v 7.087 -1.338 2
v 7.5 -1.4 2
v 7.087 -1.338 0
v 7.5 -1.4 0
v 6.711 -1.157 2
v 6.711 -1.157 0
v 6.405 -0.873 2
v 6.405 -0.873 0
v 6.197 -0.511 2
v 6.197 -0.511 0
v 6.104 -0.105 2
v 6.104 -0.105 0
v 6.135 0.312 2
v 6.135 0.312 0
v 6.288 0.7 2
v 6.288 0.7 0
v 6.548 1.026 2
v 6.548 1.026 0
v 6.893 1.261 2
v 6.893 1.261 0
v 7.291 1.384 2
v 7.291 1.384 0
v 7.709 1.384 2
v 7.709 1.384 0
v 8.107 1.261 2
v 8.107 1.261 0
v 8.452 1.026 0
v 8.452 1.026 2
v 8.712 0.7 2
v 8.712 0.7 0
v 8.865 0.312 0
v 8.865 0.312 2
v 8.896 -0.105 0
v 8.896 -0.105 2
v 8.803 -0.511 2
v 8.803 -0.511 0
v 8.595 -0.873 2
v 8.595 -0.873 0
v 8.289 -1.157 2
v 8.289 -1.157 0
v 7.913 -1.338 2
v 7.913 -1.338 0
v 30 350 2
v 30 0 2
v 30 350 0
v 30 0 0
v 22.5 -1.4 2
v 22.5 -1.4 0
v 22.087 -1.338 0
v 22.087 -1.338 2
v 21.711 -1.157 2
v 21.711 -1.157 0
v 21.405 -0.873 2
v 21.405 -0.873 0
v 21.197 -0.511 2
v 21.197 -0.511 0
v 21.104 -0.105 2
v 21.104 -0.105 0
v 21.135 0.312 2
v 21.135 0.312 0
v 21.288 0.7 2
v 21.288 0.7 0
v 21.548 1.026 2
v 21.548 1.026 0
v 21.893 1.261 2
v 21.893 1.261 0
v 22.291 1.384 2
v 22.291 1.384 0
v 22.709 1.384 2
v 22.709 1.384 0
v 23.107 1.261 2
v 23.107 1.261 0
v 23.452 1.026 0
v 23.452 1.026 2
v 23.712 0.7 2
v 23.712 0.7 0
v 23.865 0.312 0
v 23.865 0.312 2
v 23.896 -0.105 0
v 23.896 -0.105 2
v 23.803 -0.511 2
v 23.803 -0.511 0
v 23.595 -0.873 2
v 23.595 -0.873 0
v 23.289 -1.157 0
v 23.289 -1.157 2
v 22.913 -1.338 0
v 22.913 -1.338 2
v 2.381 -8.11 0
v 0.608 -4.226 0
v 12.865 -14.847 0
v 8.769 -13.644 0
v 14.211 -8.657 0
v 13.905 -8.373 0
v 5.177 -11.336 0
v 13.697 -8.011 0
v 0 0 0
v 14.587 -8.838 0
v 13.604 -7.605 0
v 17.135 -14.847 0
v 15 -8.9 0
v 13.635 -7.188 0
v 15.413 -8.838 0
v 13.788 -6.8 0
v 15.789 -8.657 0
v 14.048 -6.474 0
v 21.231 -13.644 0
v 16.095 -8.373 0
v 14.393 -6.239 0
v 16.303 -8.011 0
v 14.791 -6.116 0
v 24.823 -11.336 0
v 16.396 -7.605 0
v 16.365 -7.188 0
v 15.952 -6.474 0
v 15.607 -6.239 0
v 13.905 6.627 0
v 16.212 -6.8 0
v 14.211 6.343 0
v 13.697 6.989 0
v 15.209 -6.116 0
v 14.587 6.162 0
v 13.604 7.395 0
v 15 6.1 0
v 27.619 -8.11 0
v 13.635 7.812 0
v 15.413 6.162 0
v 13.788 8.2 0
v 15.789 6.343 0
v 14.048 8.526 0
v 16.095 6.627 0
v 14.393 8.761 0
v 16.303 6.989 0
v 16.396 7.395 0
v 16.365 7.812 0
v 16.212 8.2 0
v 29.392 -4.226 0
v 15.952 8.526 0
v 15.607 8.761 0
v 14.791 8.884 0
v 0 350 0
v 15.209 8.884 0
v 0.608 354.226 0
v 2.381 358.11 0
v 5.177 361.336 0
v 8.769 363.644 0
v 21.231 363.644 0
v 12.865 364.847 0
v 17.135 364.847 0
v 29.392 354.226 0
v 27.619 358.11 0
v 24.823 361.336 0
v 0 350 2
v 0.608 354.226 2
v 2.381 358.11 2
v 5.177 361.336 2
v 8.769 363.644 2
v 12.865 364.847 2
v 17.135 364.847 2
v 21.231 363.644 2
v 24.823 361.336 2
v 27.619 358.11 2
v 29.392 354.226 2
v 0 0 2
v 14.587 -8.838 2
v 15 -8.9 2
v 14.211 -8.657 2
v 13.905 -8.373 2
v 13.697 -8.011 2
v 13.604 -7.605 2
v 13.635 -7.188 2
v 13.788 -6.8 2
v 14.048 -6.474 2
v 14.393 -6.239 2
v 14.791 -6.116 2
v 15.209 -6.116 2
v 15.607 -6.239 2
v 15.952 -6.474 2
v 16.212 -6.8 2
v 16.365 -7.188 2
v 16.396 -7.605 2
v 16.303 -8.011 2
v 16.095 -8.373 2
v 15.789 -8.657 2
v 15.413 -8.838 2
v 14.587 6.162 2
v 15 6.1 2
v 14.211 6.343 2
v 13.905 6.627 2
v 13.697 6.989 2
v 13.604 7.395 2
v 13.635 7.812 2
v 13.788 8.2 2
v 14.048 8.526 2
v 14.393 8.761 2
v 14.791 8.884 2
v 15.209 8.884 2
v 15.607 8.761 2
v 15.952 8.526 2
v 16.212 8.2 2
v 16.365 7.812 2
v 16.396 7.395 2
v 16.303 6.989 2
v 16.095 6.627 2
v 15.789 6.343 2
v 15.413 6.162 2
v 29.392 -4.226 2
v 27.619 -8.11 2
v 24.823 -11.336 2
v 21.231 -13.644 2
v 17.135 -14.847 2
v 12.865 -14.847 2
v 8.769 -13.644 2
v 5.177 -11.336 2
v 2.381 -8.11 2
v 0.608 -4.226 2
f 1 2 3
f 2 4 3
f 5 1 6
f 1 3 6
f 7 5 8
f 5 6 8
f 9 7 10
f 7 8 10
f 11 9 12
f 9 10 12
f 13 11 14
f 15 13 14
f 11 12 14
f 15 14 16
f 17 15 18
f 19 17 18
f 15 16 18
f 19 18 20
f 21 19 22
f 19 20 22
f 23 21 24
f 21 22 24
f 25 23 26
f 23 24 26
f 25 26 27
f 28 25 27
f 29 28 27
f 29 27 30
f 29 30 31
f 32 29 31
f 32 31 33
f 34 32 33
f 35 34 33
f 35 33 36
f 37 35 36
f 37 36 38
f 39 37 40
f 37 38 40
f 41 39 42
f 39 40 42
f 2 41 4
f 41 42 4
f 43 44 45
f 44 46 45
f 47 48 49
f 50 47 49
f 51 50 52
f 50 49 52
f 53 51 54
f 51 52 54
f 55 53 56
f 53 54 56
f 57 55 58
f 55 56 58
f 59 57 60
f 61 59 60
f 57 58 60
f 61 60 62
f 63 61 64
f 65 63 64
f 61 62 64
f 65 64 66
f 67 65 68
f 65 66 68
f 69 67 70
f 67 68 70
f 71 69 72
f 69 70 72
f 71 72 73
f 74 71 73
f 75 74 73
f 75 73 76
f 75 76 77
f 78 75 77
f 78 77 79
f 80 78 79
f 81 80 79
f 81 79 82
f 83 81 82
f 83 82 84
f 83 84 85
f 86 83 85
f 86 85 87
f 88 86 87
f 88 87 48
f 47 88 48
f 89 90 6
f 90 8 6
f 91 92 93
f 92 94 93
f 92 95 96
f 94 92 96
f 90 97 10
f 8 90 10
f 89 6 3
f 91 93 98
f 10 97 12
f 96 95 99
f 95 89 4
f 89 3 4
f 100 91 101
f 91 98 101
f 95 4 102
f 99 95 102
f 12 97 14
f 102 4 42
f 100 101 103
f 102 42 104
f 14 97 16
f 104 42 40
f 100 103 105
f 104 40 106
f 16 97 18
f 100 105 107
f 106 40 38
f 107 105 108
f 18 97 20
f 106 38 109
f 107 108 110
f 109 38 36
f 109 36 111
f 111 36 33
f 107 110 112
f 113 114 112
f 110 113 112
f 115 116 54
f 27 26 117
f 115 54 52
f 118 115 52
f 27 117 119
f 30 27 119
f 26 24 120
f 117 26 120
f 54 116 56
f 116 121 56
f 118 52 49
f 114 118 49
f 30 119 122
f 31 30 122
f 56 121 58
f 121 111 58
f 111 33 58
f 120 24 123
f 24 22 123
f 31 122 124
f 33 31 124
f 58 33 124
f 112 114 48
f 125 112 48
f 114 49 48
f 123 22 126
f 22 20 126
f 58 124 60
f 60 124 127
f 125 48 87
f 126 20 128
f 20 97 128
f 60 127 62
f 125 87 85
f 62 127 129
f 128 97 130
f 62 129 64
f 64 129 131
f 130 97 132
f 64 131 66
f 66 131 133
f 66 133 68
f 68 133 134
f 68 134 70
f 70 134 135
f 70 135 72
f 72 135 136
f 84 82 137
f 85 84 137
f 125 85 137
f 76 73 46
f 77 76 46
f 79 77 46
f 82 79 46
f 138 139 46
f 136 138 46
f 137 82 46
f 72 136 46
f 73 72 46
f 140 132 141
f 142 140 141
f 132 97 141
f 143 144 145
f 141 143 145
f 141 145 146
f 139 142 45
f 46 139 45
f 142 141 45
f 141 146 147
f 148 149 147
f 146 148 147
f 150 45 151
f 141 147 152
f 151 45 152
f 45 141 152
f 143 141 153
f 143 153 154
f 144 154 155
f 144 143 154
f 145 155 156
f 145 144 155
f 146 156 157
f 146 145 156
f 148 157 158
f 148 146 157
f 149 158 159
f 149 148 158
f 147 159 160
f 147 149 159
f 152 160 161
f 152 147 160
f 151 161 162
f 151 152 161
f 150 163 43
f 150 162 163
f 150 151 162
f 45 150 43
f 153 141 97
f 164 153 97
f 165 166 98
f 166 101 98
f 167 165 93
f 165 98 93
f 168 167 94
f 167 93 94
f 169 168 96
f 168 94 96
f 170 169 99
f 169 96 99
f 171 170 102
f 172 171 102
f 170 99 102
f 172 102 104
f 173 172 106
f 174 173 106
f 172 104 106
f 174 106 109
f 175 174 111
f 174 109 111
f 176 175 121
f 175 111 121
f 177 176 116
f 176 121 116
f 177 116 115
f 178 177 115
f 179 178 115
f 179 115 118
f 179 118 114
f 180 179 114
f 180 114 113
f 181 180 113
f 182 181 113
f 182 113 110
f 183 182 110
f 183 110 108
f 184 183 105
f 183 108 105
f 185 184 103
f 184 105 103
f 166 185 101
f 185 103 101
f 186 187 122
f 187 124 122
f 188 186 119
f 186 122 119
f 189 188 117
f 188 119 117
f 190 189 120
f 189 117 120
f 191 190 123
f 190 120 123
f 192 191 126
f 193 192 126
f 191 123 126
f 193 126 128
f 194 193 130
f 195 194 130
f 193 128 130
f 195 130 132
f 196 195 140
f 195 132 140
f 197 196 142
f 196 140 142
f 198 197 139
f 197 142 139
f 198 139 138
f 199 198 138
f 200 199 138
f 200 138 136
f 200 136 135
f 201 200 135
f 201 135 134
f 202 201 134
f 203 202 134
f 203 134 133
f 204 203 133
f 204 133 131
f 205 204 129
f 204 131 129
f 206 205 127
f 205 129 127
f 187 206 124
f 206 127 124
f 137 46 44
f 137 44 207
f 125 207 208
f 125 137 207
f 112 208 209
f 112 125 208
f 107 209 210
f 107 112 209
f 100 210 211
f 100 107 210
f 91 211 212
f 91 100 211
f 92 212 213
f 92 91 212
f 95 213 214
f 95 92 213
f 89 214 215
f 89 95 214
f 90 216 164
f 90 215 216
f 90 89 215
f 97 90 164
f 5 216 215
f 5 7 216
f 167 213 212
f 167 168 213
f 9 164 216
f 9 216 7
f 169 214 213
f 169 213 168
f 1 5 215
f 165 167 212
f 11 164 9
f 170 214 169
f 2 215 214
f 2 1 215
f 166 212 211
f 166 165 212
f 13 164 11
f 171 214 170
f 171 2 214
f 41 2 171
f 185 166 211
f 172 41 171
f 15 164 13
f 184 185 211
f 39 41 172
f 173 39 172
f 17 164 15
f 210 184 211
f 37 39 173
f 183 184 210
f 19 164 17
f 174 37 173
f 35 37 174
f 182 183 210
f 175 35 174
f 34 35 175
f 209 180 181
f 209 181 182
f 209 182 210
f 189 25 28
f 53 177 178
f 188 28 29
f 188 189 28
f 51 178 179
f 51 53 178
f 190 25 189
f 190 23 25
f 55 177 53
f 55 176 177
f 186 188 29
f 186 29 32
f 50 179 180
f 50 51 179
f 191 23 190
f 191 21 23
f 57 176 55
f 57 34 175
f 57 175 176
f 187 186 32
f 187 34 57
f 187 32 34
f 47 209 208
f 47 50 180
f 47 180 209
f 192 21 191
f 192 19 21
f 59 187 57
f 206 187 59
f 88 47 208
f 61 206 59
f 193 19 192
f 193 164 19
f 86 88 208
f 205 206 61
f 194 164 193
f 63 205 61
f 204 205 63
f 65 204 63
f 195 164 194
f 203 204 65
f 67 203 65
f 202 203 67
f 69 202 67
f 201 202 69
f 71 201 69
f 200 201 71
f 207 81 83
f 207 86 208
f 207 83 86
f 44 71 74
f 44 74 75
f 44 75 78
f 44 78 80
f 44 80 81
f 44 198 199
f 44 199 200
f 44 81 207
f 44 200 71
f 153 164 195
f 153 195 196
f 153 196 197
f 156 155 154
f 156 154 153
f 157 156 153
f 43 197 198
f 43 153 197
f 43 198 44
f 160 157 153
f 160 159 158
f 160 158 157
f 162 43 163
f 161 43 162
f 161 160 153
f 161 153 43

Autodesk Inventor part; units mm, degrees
ref_plane "YZ Plane" through (0, 0, 0) normal (1, 0, 0) x (0, 1, 0)
ref_plane "XZ Plane" through (0, 0, 0) normal (0, 1, 0) x (-1, 0, 0)
ref_plane "XY Plane" through (0, 0, 0) normal (0, 0, 1) x (1, 0, 0)
sketch "スケッチ1" plane through (0, 0, 0) normal (0, 0, 1) x (1, 0, 0)
  line L0 (30, 0) -> (30, 350)
  line L1 (0, 350) -> (0, 0)
  arc A0 (30, 350) -> (0, 350) centre (15, 350) ccw
  arc A1 (0, 0) -> (30, 0) centre (15, 0) ccw
  dimension "d35" = 30
  dimension "d36" = 350
extrude "押し出し1" add sketch "スケッチ1" along normal blind 2
sketch "スケッチ3" plane through (0, 0, 2) normal (0, 0, 1) x (1, 0, 0)
  line L0 (0, 350) -> (0, 0) projected
  arc A0 (0, 0) -> (30, 0) centre (15, 0) ccw projected
  line L1 (0, 0) -> (30, 0) construction
  point P0 (7.5, 0)
  point P1 (15, -7.5)
  point P2 (22.5, 0)
  point P3 (15, 7.5)
  dimension "d41" = 7.5
  dimension "d44" = 360
hole "穴1" at (7.5, 0, 2) at (15, -7.5, 2) at (22.5, 0, 2) at (15, 7.5, 2) direction (0, 0, -1) diameter 2.8 end through all
properties part number "arm_link" material "GFRP"
